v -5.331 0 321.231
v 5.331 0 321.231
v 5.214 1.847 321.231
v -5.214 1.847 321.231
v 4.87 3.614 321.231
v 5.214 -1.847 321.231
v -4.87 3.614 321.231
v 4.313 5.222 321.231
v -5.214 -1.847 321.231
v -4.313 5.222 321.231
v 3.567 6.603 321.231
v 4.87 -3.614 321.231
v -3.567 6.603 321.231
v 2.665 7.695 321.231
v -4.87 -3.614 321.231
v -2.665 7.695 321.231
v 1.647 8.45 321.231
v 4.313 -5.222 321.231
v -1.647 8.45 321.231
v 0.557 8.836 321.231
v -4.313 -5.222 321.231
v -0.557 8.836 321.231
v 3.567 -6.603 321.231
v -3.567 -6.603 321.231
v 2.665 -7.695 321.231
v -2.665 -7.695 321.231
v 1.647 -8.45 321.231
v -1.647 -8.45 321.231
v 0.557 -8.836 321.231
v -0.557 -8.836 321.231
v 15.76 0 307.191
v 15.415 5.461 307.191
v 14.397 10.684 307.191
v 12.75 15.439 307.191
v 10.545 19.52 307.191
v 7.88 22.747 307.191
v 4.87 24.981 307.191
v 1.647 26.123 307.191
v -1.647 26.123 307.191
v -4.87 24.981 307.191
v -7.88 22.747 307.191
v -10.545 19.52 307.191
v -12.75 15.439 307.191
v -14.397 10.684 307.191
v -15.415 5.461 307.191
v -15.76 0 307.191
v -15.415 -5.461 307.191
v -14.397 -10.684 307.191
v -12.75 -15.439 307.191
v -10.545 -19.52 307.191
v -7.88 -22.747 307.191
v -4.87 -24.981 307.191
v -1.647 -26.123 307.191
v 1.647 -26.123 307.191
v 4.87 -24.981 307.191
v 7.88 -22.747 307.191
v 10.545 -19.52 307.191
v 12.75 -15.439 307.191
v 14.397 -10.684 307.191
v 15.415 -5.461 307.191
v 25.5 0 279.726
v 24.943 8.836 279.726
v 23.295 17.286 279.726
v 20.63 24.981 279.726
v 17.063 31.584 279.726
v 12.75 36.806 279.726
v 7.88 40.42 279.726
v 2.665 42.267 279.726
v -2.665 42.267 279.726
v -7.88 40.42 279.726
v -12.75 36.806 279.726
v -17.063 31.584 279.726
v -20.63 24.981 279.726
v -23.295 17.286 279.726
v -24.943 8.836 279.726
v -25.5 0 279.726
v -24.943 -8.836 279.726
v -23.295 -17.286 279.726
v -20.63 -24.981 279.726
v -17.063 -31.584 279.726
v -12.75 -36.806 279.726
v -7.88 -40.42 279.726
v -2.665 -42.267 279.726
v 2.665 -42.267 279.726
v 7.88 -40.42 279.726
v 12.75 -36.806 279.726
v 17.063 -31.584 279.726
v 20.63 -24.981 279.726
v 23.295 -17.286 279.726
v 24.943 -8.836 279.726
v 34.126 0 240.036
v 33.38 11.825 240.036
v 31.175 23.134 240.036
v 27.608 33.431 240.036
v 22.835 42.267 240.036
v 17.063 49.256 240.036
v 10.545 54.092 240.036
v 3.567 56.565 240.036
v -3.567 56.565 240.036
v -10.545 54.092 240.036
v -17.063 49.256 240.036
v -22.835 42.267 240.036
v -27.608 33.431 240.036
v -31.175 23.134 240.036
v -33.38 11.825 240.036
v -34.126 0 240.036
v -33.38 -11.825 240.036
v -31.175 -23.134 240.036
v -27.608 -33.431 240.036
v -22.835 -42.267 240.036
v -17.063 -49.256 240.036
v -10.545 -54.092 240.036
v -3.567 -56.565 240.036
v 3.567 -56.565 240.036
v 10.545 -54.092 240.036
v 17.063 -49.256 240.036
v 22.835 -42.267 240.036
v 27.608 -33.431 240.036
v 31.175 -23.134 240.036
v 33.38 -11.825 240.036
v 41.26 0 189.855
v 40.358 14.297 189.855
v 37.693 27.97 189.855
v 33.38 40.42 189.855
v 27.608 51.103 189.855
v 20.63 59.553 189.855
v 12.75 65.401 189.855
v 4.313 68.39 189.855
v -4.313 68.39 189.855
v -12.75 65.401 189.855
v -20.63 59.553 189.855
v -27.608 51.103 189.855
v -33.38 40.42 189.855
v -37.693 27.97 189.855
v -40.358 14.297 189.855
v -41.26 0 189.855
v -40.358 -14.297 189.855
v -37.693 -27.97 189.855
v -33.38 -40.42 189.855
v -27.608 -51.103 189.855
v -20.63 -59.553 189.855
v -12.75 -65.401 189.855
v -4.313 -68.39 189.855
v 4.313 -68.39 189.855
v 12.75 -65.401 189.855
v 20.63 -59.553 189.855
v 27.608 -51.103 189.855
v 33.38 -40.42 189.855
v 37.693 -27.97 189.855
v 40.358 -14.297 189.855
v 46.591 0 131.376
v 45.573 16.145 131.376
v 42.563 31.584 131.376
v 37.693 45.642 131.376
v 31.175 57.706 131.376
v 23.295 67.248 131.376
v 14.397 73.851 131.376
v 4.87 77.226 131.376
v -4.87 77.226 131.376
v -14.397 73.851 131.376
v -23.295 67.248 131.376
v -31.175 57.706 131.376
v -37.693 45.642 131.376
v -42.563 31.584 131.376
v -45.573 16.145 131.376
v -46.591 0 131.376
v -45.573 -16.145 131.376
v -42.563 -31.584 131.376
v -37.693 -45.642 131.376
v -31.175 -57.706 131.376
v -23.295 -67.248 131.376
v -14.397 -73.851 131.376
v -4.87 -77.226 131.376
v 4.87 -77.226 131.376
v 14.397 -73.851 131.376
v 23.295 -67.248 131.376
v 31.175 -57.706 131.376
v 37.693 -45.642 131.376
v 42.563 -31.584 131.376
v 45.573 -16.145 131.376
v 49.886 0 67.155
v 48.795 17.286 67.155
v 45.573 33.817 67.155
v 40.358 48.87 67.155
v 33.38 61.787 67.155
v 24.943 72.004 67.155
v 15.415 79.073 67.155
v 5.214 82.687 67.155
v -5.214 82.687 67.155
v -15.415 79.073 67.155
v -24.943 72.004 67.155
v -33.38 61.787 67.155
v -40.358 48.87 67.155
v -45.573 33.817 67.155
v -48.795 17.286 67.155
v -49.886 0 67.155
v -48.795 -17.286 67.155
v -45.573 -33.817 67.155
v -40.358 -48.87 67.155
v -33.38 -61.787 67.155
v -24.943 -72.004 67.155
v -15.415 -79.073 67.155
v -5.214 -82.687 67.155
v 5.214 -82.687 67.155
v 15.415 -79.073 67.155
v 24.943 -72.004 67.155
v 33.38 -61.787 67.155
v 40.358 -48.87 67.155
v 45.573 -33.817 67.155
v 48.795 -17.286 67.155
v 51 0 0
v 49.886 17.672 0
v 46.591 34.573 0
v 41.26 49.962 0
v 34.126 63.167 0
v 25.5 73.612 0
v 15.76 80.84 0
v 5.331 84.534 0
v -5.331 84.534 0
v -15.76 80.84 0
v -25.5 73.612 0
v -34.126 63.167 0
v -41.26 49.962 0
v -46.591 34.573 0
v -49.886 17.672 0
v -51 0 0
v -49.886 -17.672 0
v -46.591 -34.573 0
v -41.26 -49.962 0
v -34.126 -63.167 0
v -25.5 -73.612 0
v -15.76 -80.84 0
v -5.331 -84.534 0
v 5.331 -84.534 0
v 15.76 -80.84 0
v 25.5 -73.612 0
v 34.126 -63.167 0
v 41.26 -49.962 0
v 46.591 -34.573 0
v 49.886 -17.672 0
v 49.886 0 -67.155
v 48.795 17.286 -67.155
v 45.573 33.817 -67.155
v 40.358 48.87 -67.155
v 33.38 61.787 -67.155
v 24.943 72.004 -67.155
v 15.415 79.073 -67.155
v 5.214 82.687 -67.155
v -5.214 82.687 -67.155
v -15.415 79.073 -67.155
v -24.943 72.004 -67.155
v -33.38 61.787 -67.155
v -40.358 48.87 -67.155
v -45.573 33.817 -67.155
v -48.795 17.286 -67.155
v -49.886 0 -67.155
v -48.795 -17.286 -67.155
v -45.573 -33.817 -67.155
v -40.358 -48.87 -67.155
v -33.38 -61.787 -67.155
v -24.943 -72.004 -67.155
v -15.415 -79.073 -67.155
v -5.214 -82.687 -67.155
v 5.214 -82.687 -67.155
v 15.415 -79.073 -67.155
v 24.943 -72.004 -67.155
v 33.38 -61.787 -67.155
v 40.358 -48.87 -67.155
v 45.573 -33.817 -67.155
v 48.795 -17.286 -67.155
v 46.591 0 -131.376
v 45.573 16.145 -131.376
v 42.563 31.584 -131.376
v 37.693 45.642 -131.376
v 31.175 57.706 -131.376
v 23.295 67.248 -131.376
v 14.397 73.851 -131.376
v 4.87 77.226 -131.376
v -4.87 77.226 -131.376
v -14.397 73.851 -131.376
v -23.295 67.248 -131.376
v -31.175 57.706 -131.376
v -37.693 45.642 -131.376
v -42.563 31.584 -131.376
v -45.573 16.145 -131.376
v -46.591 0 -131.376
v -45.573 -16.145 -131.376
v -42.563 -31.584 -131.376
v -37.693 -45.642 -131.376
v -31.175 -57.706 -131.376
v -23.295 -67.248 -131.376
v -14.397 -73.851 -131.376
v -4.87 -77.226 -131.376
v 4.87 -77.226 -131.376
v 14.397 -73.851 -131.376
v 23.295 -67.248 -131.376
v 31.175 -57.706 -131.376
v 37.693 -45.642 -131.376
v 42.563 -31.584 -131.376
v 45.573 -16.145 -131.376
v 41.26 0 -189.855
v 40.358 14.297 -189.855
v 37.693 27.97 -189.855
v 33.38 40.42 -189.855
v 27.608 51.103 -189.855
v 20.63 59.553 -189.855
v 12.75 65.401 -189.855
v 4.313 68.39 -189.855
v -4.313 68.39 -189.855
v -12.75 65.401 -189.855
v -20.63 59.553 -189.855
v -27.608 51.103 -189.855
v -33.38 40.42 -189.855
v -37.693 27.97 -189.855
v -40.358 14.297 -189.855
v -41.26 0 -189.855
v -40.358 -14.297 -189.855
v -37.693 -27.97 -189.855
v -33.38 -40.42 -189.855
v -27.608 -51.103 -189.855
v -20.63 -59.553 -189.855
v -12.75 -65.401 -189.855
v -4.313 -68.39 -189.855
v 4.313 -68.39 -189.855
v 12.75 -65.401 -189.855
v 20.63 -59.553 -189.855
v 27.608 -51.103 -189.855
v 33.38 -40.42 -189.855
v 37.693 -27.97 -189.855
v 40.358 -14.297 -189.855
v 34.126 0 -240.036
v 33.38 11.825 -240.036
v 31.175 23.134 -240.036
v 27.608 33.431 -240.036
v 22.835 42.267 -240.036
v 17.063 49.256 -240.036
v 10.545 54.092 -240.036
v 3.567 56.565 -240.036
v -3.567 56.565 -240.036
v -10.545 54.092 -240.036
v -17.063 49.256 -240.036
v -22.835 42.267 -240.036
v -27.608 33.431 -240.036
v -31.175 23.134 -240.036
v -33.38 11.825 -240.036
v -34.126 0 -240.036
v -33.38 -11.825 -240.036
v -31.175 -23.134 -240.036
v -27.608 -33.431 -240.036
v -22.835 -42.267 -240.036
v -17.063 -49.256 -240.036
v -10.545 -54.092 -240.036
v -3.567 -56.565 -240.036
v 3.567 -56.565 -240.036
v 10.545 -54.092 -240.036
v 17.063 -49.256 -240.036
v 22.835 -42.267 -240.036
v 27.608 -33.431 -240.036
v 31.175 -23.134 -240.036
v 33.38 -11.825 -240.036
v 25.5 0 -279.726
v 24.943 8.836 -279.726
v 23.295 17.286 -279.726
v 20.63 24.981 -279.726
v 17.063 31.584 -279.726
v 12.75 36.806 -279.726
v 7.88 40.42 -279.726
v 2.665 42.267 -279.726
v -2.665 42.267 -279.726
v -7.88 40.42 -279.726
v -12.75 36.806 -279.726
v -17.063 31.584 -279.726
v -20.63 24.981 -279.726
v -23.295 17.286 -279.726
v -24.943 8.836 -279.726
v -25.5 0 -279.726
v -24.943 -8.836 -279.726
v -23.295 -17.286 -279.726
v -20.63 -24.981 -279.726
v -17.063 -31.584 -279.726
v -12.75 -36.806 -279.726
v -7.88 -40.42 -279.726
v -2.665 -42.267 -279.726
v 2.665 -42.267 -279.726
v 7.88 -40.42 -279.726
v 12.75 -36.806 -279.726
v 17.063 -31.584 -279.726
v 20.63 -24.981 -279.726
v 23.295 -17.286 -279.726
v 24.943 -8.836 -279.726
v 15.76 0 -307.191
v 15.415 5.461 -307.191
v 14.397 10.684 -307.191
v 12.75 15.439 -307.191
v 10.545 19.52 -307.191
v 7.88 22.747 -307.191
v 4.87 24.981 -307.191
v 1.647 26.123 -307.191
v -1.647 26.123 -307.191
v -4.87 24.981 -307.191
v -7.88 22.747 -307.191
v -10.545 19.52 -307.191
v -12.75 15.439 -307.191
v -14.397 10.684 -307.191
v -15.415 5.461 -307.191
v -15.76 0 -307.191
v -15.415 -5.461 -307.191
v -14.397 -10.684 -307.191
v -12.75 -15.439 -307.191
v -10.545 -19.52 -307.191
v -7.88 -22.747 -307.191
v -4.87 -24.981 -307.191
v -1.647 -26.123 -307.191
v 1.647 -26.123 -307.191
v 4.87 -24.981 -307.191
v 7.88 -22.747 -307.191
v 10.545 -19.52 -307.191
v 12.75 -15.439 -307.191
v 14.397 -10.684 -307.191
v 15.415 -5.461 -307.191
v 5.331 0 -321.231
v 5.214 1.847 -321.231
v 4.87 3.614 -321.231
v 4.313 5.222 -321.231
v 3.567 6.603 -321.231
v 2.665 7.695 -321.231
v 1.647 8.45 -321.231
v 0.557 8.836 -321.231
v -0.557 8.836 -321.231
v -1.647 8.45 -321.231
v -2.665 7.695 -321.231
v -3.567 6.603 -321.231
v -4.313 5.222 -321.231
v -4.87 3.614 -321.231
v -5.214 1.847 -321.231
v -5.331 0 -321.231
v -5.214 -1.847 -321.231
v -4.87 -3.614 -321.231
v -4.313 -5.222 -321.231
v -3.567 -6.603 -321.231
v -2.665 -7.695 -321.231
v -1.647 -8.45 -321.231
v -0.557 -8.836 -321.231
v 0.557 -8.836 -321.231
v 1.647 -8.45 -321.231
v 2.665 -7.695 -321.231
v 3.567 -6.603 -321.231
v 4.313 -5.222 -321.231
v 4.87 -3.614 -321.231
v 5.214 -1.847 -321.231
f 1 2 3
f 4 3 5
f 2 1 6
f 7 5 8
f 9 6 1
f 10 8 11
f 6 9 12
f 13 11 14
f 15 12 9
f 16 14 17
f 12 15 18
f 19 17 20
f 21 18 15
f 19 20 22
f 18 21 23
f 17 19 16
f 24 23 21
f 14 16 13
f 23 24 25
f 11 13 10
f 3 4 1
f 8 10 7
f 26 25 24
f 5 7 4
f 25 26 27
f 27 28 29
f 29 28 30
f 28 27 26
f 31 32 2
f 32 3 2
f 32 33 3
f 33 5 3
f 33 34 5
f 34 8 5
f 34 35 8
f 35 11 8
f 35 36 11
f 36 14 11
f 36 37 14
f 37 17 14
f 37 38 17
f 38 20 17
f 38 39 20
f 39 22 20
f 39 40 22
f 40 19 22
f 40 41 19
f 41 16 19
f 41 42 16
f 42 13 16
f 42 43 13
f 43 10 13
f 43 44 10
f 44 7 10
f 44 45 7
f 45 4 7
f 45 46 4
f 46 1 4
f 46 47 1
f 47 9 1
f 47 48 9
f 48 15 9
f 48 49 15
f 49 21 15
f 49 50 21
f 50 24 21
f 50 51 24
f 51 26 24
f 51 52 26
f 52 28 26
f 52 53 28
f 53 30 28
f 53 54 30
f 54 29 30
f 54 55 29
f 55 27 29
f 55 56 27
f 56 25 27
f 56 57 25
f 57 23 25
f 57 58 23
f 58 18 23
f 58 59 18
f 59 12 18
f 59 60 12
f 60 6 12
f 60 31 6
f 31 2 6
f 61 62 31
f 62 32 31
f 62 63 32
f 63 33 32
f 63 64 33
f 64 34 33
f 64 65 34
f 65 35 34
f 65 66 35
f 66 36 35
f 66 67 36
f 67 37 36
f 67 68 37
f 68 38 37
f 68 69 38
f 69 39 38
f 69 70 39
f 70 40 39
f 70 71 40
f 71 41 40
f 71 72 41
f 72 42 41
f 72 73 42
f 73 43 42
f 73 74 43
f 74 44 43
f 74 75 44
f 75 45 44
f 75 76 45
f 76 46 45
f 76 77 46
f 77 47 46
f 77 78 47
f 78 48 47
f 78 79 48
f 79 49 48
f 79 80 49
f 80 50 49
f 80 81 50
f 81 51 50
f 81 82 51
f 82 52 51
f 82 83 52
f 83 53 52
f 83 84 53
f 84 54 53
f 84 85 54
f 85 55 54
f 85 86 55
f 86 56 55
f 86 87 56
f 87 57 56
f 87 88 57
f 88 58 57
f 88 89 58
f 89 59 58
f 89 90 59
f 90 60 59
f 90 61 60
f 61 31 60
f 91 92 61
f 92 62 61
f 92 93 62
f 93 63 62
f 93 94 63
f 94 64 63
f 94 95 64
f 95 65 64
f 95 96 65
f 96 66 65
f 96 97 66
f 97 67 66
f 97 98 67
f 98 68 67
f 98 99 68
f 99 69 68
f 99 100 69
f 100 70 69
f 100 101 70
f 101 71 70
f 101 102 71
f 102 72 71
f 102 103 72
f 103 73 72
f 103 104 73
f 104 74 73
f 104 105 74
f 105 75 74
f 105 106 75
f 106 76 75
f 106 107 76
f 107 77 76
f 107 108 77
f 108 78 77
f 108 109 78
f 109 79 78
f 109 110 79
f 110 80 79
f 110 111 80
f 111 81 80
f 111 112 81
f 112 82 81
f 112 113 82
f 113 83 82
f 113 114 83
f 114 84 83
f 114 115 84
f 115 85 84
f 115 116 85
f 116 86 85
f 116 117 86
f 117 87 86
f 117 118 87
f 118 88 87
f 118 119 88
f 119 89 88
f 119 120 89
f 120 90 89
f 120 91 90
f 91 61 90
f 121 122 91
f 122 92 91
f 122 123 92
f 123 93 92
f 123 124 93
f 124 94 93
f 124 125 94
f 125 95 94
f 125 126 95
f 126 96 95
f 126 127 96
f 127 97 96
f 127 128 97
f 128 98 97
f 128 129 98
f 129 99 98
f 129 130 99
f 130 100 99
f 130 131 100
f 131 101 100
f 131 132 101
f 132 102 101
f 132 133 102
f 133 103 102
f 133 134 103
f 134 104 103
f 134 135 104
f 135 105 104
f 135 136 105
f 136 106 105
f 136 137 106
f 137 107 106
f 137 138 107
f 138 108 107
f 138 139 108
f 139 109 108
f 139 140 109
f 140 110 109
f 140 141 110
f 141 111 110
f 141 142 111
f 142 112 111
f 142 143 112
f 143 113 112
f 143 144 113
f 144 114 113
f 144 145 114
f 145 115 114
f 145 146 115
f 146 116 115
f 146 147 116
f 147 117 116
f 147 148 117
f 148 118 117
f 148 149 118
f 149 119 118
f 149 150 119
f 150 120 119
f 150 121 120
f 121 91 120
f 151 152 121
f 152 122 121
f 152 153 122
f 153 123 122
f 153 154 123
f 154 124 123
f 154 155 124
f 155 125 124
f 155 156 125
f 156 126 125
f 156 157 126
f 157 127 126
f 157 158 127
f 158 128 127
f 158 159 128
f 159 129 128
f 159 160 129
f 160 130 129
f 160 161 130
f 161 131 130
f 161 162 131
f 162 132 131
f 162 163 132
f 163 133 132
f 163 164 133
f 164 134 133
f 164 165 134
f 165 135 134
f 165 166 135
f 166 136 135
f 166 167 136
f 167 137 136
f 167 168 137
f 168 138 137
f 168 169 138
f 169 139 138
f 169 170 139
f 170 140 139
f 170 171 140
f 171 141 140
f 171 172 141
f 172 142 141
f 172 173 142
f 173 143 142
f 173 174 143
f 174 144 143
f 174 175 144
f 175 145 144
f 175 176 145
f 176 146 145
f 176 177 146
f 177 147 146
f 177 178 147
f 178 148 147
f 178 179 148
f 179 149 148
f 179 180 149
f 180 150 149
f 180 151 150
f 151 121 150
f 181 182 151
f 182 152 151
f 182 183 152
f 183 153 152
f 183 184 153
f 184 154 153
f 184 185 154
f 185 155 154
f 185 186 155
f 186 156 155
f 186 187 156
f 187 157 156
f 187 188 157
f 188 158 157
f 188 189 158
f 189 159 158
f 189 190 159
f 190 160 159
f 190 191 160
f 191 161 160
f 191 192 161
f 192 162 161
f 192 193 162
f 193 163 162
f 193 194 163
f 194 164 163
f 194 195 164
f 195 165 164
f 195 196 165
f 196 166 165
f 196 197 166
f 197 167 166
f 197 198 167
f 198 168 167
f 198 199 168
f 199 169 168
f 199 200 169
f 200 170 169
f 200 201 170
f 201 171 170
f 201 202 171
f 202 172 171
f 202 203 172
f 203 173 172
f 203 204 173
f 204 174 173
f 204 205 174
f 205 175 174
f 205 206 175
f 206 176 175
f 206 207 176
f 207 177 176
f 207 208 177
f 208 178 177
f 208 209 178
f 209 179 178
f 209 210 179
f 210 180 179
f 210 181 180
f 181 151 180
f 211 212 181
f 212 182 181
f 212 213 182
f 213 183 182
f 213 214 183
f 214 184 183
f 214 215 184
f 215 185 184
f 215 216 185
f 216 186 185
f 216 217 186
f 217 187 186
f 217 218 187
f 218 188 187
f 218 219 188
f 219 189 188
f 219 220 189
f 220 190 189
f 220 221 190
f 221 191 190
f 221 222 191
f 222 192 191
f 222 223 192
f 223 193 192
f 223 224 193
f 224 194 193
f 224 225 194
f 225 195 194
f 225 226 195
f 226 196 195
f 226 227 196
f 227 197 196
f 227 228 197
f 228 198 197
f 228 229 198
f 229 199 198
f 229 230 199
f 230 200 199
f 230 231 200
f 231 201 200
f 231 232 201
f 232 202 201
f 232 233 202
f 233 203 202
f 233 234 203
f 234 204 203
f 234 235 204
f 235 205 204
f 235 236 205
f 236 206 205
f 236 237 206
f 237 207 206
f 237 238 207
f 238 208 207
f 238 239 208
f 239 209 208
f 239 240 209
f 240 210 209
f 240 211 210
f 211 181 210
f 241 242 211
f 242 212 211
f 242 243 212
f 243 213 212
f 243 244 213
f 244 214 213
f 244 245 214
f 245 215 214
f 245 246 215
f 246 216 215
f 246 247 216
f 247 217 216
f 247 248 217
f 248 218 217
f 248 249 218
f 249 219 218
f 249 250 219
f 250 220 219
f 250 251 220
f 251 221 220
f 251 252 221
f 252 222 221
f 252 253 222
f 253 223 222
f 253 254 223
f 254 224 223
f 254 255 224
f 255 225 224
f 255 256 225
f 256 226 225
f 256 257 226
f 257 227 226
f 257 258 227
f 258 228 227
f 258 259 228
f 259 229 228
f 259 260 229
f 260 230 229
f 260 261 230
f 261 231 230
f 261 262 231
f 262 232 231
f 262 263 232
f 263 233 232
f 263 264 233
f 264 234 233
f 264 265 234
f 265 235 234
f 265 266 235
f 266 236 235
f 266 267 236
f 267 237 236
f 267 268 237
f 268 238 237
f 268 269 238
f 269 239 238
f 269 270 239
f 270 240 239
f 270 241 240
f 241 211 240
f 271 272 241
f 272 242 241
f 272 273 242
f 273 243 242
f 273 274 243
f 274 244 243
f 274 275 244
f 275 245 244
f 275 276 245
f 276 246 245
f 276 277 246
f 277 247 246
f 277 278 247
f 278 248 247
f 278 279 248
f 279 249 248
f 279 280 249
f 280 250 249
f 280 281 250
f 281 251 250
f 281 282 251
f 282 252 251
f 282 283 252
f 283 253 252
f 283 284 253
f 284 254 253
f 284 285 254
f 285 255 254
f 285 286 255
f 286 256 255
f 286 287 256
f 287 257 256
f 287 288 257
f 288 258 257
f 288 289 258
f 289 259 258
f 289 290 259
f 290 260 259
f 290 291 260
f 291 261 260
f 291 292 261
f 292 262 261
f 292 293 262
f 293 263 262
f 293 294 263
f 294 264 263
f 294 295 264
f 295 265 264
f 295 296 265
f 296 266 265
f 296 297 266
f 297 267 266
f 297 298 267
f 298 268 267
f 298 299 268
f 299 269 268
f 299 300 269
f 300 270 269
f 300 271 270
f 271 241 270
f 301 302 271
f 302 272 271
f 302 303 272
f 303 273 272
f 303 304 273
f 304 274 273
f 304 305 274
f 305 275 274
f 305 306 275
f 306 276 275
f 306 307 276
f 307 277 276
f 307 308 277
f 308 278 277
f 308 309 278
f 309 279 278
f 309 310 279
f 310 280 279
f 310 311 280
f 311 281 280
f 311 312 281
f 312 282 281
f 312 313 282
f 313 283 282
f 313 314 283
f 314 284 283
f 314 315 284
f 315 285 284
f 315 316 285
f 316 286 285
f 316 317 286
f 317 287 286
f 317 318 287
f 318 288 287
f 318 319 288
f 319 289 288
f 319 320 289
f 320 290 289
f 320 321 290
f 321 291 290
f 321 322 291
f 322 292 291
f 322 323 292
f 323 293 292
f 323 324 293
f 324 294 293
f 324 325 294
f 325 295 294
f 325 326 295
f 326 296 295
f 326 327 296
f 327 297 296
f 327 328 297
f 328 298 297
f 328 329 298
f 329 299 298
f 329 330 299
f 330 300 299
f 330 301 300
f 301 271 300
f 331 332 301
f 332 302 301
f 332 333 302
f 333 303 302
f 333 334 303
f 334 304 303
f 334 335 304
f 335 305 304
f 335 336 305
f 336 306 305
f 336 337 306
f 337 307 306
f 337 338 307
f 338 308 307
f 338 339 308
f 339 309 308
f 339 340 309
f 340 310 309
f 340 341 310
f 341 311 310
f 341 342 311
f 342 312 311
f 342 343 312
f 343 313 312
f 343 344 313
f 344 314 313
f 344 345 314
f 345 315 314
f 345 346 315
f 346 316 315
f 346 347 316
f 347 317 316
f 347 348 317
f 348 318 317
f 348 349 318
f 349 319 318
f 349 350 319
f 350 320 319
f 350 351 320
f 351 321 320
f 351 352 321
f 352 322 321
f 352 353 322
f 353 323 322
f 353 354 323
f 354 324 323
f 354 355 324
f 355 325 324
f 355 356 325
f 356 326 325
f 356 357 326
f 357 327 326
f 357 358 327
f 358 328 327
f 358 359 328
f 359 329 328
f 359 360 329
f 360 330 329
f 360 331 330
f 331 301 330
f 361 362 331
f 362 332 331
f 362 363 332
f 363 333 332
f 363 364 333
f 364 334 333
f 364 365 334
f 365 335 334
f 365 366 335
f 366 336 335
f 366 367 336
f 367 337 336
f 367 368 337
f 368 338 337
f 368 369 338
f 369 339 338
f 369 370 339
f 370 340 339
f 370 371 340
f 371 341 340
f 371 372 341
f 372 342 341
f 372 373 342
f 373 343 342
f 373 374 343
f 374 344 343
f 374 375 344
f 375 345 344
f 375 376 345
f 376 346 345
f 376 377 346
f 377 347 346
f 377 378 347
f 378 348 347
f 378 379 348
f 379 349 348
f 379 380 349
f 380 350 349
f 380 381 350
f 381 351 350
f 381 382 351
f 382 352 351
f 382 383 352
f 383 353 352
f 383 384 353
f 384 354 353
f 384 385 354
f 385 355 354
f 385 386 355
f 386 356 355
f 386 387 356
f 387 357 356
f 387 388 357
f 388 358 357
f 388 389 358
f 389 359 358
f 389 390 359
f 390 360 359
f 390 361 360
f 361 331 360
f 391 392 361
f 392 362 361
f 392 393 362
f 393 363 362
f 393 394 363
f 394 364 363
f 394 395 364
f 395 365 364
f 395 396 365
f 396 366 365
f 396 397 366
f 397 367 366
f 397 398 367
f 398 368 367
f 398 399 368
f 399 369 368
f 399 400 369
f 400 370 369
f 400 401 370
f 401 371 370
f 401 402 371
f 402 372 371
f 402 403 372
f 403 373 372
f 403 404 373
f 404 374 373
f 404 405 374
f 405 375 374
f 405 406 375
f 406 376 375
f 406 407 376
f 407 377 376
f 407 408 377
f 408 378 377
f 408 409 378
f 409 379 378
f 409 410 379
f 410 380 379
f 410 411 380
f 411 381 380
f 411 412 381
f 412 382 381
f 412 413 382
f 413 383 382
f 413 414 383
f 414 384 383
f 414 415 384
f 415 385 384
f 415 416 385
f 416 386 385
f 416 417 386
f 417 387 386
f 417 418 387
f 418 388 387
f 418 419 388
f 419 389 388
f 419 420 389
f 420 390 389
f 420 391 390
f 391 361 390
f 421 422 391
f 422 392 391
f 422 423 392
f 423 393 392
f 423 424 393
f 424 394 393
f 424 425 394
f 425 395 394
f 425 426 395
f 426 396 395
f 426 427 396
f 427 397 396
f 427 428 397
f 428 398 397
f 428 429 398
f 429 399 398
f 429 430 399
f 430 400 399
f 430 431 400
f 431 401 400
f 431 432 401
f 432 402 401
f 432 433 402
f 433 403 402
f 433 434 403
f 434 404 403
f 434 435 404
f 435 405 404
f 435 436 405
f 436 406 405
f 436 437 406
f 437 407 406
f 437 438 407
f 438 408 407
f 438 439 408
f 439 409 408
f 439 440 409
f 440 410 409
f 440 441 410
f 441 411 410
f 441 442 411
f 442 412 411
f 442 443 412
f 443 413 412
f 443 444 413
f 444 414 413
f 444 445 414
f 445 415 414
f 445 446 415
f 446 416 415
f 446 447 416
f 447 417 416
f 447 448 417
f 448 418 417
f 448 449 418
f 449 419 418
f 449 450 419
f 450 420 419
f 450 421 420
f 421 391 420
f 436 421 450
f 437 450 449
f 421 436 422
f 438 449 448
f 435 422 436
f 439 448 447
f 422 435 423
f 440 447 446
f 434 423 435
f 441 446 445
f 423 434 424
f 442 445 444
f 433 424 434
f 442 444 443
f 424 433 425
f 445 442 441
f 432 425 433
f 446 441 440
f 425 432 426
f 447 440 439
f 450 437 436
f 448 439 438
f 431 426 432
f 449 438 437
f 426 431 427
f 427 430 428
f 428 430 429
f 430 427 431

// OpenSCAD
// Generated by SolidPython 1.0.1 on 2020-07-29 00:46:45


scale(v = [3, 5, 19]) {
	sphere(r = 17);
}
/***********************************************
*********      SolidPython code:      **********
************************************************
 
# import packages: SolidPython
from solid import *
from solid.utils import *
from itertools import chain, combinations, permutations


class Resize:

    def __init__(self, scad_file):
        self.scad_file = scad_file
        #self.scad_file = import_scad(scad_file)
        # cone/cylinder param:
        self.r1 = 0
        self.r2 = 0
        self.h = 0
        # rectangular prism param:
        self.w = 0
        self.l = 0
        # ellipse param:
        self.r = 0

    # import OpenScad code (file name corresponds to shape)


    # classify shape + parameters
    def assign(self, param1, param2, param3):
        if self.scad_file == 'cone.scad':
            self.r1 = param1
            self.r2 = param2
            self.h = param3
        elif self.scad_file == 'cylinder.scad':
            self.r1 = param1
            self.r2 = param2
            self.h = param3
        elif self.scad_file == 'rectangularPrism.scad':
            self.h = param1
            self.l = param2
            self.w = param3
        else:
            self.r = param1
            self.h = param2

    # resize parameters
    def iterate(self):
        x = range(3, 20, 2)
        i = 1
        if self.scad_file == 'cone.scad':
            tempList = list(permutations(x, 2))
            for temp in tempList:
                param1 = temp[0]
                param2 = temp[1]
                filepath = 'produced_scad_files/' + 'cone' + str(param1) + '_' + str(param2) + '_' + '.scad'
                scad_render_to_file(cylinder(h=param1, r1=param2, r2=0), filepath)

        elif self.scad_file == 'cylinder.scad':
            tempList = list(permutations(x, 3))
            for temp in tempList:
                param1 = temp[0]
                param2 = temp[1]
                filepath = 'produced_scad_files/' + 'cylinder' + str(param1) + '_' + str(param2) + '_' + '.scad'
                scad_render_to_file(cylinder(h=param1, r1=param2, r2=param2), filepath)

        elif self.scad_file == 'rectangularPrism.scad':
            tempList = list(permutations(x, 3))
            for temp in tempList:
                param1 = temp[0]
                param2 = temp[1]
                param3 = temp[2]
                filepath = 'produced_scad_files/' + 'rectangularPrism' + str(param1) + '_' + str(param2) + '_' + str(
                    param3) + '.scad'
                scad_render_to_file(cube(size=(param1, param2, param3)), filepath)

        elif self.scad_file == 'ellipse.scad':
            tempList = list(permutations(x, 4))
            for temp in tempList:
                param1 = temp[0]
                param2 = temp[1]
                param3 = temp[2]
                param4 = temp[3]
                filepath = 'produced_scad_files/' + 'ellipse' + str(param1) + '_' + str(param2) + '_' + str(param3) + '_' + str(param4) + '.scad'
                scad_render_to_file(scale([param1, param2, param3])(sphere(r=param4)), filepath)

    def render_to_scadfile(self):
        scad_render_to_file(scad, 'example.scad') 
 
************************************************/
